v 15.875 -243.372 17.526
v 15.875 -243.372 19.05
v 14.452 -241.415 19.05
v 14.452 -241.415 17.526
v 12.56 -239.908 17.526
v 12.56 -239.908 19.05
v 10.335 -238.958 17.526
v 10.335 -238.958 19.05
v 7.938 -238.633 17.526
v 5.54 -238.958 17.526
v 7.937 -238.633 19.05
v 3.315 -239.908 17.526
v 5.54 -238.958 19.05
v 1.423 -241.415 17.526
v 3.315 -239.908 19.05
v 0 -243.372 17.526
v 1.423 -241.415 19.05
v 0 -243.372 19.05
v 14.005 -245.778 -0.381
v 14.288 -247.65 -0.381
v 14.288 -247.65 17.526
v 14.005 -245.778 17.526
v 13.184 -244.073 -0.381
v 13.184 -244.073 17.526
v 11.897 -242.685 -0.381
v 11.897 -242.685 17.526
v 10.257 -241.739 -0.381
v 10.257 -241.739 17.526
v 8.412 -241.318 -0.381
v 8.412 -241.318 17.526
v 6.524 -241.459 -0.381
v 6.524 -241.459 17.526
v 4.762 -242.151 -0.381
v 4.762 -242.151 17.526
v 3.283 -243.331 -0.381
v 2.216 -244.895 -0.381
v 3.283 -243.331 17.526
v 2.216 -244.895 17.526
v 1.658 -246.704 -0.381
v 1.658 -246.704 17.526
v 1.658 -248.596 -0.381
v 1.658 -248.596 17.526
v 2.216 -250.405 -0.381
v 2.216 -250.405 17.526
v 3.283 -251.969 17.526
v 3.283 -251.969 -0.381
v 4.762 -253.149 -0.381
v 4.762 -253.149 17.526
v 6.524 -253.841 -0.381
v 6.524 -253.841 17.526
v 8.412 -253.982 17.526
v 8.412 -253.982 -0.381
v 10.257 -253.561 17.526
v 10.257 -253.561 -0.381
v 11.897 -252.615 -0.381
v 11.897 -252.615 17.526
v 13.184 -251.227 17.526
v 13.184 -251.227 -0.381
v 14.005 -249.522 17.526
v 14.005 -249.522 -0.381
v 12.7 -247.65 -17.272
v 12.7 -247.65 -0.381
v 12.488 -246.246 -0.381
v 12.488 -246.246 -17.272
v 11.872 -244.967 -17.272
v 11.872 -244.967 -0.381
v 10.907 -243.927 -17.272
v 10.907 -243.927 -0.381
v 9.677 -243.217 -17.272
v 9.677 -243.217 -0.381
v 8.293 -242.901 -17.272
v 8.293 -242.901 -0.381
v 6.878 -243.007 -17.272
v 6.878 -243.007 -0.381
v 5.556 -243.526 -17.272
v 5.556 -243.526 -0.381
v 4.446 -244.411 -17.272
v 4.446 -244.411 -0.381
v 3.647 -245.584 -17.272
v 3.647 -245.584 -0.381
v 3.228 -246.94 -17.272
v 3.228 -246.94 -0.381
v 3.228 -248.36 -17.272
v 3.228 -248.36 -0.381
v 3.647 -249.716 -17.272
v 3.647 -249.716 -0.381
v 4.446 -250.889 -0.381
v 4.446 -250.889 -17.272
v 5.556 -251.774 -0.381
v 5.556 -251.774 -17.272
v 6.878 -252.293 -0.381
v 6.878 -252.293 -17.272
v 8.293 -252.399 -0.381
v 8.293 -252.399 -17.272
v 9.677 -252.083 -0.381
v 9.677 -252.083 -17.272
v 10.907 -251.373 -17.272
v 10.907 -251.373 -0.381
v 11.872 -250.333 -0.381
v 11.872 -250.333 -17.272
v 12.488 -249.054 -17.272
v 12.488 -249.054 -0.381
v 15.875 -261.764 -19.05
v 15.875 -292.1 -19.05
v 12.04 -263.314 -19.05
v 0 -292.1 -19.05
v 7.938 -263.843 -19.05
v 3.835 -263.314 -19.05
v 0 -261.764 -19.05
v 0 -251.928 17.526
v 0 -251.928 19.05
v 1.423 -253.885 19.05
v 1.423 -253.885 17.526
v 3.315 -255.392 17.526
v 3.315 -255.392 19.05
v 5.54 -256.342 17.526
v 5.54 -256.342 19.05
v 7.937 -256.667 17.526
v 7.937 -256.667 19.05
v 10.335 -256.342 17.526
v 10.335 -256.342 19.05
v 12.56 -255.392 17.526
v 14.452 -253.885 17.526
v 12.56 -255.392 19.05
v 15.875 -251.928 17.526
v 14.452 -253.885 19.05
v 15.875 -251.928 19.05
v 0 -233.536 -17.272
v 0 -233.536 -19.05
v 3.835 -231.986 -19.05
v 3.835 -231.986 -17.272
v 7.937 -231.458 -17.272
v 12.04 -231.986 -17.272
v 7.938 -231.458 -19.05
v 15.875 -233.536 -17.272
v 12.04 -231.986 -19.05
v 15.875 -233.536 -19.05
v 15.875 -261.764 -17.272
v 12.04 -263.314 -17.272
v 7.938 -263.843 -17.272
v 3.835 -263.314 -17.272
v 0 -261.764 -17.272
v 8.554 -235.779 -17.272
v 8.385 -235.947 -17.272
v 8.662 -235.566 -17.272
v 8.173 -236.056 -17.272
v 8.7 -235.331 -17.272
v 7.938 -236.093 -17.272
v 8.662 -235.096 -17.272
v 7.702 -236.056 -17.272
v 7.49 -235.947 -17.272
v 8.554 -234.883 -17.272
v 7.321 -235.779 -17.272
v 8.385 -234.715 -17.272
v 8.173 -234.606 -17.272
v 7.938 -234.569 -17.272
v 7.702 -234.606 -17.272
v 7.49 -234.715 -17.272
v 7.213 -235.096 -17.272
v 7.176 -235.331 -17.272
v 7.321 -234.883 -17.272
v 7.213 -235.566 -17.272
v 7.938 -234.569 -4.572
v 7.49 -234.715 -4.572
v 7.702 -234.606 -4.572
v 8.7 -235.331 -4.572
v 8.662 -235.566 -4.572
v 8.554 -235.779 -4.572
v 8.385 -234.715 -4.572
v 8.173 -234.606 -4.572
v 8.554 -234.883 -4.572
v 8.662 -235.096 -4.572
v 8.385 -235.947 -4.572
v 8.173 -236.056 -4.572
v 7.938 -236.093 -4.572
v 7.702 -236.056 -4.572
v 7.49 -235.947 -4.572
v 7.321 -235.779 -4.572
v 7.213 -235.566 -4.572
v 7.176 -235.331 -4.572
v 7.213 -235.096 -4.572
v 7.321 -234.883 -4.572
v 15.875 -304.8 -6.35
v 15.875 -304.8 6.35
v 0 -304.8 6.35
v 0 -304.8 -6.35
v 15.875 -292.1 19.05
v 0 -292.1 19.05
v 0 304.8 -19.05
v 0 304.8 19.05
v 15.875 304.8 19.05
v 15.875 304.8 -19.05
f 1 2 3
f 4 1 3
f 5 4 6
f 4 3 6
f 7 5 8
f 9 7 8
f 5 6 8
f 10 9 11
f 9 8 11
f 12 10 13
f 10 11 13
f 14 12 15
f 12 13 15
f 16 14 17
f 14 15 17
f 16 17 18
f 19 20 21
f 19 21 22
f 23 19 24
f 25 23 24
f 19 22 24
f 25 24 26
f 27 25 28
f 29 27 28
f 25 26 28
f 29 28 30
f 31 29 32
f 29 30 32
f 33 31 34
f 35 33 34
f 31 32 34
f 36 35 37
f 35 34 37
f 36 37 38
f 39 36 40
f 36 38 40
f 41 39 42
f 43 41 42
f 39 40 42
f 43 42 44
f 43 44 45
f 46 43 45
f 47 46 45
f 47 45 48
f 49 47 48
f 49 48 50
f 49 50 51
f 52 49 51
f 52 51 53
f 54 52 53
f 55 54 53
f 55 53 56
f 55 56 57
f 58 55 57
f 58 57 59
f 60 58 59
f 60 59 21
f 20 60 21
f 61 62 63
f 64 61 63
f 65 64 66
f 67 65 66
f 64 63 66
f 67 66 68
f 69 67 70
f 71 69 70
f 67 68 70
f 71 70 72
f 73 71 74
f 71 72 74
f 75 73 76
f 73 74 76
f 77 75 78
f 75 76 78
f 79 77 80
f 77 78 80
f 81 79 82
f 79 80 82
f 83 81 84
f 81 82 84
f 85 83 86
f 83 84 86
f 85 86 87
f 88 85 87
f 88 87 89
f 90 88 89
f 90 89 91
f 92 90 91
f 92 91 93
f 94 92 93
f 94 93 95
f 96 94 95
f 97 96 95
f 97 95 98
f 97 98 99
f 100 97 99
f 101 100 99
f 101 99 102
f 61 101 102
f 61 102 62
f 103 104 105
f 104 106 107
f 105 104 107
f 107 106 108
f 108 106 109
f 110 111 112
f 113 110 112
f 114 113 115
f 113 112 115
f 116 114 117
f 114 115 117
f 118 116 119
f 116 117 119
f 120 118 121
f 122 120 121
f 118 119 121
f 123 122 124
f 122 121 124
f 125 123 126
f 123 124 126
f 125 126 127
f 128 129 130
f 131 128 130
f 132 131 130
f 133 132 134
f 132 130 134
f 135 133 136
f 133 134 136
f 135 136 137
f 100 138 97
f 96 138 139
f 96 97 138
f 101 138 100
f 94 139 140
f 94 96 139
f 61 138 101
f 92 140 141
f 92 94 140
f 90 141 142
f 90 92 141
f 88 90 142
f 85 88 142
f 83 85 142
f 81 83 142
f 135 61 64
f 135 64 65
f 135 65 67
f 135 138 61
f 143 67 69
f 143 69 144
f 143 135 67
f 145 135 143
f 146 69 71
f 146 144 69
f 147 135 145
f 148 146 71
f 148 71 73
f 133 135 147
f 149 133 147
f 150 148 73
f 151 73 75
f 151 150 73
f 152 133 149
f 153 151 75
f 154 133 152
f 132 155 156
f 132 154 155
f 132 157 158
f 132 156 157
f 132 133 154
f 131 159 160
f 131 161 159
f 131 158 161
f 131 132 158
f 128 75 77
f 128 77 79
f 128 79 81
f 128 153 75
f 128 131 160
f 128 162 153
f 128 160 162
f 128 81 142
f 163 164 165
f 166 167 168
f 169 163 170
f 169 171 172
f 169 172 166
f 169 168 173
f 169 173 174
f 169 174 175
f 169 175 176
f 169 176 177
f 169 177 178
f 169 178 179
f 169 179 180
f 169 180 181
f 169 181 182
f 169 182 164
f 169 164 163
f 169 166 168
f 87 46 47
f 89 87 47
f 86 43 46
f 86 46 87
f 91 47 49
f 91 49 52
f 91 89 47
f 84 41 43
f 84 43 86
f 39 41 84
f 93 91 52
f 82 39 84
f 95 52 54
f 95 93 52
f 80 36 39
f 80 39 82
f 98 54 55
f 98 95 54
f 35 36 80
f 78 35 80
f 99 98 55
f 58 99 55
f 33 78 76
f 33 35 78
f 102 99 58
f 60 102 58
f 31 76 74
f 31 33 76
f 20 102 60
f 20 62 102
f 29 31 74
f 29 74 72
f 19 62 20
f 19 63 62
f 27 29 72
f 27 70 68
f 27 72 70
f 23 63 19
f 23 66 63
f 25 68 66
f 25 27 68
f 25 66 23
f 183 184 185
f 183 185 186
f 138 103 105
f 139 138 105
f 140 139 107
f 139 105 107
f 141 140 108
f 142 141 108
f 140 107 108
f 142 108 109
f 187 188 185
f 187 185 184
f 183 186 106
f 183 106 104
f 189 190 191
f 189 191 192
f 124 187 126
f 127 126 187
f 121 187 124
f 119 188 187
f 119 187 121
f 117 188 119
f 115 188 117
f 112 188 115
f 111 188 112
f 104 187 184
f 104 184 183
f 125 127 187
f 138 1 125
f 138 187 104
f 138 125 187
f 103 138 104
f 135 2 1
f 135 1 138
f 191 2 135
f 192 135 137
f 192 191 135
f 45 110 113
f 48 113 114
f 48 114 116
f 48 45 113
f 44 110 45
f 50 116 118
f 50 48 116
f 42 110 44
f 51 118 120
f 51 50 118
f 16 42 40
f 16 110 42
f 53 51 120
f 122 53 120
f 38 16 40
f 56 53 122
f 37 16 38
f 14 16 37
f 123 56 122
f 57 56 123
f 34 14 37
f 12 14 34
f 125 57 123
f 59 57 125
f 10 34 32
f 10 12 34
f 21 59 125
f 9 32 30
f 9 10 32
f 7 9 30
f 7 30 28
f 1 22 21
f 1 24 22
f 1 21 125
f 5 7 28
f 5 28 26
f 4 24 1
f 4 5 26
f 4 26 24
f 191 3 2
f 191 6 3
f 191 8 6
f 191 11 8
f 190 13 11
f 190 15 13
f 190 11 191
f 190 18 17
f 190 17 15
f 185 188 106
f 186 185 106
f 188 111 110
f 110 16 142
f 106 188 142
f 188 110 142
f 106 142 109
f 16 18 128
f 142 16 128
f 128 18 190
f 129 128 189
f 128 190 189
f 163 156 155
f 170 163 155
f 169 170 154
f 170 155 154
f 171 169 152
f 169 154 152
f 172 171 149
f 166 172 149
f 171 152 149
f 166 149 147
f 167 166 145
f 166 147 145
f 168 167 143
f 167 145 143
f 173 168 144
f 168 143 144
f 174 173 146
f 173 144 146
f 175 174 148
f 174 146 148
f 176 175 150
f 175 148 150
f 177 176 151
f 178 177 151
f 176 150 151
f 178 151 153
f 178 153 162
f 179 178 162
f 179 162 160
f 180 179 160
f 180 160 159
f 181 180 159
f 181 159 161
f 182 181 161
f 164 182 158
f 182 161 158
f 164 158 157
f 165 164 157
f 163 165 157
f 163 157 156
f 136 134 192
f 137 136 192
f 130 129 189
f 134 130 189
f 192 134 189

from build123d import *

# Parameters (mm, degrees)
SKETCH1_W           = 38.1
SKETCH1_H           = 609.6
BOSS_EXTRUDE1_DEPTH = 15.875
SKETCH2_R           = 4.7625
CUT_EXTRUDE1_DEPTH  = 308.581965702
SKETCH3_R           = 6.35
CUT_EXTRUDE2_DEPTH  = 19.431
CHAMFER1_SIZE       = 12.7
SKETCH4_R           = 16.1925
CUT_EXTRUDE3_DEPTH  = 1.778
SKETCH5_R           = 9.017
CUT_EXTRUDE4_DEPTH  = 1.524
SKETCH6_R           = 0.762
CUT_EXTRUDE5_DEPTH  = 12.7


with BuildPart() as part:
    # Sketch1 → Boss-Extrude1 (new body)
    with BuildSketch(Plane(origin=(0, 0, 0), x_dir=(0, 0, -1), z_dir=(1, 0, 0))):
        Rectangle(SKETCH1_W, SKETCH1_H)
    extrude(amount=BOSS_EXTRUDE1_DEPTH)

    # Sketch2 → Cut-Extrude1 (cut, through all)
    with BuildSketch(Plane.XY.offset(19.05)):
        with Locations((7.9375, -247.65)):
            Circle(SKETCH2_R)
    extrude(amount=-CUT_EXTRUDE1_DEPTH, mode=Mode.SUBTRACT)

    # Sketch3 → Cut-Extrude2 (cut)
    with BuildSketch(Plane.XY.offset(19.05)):
        with Locations((7.9375, -247.65)):
            Circle(SKETCH3_R)
    extrude(amount=-CUT_EXTRUDE2_DEPTH, mode=Mode.SUBTRACT)

    # Chamfer1
    chamfer1_edges = [part.edges().sort_by_distance(p)[0] for p in [
        (7.9375, -304.8, -19.05),
        (7.9375, -304.8, 19.05),
    ]]
    chamfer(chamfer1_edges, length=CHAMFER1_SIZE)

    # Sketch4 → Cut-Extrude3 (cut)
    with BuildSketch(Plane(origin=(0, 0, -19.05), x_dir=(-1, 0, 0), z_dir=(0, 0, -1))):
        with Locations((-7.9375, -247.65)):
            Circle(SKETCH4_R)
    extrude(amount=-CUT_EXTRUDE3_DEPTH, mode=Mode.SUBTRACT)

    # Sketch5 → Cut-Extrude4 (cut)
    with BuildSketch(Plane.XY.offset(19.05)):
        with Locations((7.9375, -247.65)):
            Circle(SKETCH5_R)
    extrude(amount=-CUT_EXTRUDE4_DEPTH, mode=Mode.SUBTRACT)

    # Sketch6 → Cut-Extrude5 (cut)
    with BuildSketch(Plane(origin=(0, 0, -17.272), x_dir=(-1, 0, 0), z_dir=(0, 0, -1))):
        with Locations(Location((-7.9375, -235.331, 0), (0, 0, 90))):
            Circle(SKETCH6_R)
    extrude(amount=-CUT_EXTRUDE5_DEPTH, mode=Mode.SUBTRACT)


solid = part.part
